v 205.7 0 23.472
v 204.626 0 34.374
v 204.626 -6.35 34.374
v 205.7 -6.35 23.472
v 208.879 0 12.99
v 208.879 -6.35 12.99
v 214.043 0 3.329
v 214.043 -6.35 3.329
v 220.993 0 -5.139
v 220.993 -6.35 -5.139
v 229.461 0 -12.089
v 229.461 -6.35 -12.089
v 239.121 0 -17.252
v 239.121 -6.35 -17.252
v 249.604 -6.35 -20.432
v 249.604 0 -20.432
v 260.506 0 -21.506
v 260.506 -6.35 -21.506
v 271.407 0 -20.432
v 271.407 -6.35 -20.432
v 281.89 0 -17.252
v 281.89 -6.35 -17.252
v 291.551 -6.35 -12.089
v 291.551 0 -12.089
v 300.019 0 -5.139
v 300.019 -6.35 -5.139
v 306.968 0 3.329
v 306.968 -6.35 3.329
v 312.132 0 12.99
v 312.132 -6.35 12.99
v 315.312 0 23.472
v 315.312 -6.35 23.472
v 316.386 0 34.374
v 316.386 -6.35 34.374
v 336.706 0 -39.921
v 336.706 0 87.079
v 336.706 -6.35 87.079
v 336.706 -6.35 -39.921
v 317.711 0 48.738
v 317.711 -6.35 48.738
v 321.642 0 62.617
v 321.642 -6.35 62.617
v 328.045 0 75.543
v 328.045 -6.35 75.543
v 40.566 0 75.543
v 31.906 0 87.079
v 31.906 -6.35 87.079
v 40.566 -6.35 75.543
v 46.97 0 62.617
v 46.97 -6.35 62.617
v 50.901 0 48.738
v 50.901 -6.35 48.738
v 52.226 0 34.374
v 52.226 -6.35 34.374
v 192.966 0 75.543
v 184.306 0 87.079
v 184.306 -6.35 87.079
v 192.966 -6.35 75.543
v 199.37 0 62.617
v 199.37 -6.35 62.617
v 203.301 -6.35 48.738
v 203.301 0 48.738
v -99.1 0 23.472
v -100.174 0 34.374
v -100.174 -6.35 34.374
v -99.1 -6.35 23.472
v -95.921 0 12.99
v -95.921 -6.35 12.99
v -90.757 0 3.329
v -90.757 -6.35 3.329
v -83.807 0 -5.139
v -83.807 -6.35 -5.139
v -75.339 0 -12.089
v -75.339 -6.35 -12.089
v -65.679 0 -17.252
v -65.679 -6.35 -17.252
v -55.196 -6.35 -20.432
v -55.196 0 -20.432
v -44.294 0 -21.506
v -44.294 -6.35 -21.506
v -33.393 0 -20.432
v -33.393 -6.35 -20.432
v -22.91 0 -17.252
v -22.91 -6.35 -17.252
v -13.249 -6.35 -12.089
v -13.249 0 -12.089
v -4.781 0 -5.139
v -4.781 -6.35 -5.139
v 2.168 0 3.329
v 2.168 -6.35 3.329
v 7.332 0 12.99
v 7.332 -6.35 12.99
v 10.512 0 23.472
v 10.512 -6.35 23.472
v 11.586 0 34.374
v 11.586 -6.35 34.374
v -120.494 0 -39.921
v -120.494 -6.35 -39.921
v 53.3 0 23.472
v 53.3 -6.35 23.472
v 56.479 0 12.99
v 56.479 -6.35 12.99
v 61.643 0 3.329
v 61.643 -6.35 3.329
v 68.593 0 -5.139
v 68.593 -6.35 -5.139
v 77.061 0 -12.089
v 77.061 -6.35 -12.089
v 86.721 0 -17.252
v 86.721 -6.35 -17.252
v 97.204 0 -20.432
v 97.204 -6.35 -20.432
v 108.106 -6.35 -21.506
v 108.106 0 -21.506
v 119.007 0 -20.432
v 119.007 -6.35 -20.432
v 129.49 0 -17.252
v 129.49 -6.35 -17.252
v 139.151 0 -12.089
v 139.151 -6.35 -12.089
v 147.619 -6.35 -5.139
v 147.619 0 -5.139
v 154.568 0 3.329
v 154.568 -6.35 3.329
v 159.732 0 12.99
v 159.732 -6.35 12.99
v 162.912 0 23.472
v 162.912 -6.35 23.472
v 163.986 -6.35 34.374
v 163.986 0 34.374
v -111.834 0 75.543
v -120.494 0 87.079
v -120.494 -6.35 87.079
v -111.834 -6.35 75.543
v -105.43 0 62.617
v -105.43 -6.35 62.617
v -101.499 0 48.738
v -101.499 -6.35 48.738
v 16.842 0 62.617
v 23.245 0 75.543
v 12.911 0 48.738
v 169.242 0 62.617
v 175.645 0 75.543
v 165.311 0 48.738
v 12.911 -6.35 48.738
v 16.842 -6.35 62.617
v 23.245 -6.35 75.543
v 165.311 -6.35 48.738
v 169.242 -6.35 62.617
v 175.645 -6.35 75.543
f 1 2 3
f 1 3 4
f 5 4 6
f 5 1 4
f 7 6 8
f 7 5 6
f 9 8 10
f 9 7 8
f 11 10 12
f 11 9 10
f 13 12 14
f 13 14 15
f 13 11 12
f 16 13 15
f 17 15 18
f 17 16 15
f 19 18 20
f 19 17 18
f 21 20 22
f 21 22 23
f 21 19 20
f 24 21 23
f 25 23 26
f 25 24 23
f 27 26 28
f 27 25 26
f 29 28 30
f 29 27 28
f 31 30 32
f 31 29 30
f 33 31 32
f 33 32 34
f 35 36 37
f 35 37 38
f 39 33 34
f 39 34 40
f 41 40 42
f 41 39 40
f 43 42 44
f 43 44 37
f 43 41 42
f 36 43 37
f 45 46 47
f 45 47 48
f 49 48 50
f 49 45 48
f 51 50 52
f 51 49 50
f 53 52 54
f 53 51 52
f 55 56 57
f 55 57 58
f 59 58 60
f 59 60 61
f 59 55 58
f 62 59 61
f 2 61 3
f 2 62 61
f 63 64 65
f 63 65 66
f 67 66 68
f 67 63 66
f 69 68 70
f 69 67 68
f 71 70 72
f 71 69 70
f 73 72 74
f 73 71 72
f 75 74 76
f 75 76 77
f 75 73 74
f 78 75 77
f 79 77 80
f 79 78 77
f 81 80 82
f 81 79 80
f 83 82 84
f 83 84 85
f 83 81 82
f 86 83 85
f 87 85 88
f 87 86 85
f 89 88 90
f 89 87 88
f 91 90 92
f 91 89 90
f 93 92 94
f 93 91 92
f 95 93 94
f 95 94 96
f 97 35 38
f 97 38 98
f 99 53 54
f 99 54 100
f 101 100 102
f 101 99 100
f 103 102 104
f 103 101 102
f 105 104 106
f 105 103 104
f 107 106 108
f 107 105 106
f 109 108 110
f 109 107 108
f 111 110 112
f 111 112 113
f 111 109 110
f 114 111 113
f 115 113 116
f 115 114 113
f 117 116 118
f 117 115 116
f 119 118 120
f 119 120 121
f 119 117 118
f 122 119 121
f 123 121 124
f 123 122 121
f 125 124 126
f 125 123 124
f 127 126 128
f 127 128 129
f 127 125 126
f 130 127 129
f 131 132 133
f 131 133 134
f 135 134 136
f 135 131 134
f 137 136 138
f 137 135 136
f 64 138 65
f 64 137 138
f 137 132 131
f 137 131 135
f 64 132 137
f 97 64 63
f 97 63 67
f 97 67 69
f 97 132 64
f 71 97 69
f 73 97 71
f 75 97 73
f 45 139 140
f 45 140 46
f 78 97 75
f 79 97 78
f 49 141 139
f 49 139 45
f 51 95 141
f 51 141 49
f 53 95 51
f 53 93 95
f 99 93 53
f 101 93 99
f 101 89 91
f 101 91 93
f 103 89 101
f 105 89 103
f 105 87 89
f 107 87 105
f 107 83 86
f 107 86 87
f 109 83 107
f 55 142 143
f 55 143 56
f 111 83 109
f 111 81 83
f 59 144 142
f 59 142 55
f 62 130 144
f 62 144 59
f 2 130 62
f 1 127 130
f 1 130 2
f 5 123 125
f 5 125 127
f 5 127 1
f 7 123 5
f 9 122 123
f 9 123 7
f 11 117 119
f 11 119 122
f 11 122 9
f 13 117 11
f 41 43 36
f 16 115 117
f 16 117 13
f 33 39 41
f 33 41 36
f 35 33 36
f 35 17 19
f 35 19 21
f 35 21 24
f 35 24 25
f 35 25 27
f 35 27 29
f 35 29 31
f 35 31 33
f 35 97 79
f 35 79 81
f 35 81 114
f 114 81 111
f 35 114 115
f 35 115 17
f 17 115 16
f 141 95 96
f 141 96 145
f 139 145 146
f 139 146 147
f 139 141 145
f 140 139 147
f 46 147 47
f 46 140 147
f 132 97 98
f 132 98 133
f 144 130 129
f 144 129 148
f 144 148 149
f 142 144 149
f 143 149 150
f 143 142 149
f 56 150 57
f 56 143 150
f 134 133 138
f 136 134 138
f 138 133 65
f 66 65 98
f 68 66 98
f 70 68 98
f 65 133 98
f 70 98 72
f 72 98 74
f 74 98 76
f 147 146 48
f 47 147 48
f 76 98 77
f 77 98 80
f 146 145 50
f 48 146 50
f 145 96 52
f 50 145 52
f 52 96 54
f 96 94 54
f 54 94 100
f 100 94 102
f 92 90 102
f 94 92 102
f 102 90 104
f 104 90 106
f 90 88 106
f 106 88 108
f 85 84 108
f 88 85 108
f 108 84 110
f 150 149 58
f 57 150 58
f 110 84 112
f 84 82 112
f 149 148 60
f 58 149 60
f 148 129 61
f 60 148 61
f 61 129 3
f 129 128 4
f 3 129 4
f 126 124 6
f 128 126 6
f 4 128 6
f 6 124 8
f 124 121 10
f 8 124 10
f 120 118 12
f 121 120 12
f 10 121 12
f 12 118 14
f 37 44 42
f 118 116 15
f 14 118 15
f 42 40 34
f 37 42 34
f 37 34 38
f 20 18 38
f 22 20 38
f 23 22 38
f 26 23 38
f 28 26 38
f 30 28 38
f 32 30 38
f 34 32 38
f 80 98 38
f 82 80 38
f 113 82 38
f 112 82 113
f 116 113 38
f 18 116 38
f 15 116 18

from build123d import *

# Parameters (mm, degrees)
BOSS_EXTRUDE1_DEPTH = 6.35


with BuildPart() as part:
    # Sketch1 → Boss-Extrude1 (new body)
    with BuildSketch(Plane(origin=(0, 0, 0), x_dir=(1, 0, 0), z_dir=(0, 1, 0))):
        with BuildLine():
            ThreePointArc((11.585828754, -34.373994235), (16.841756292, -62.617220967), (31.905828754, -87.078994235))
            Line((31.905828754, -87.078994235), (31.905828754, 39.921005765))
            Line((31.905828754, 39.921005765), (-120.494171246, 39.921005765))
            Line((-120.494171246, 39.921005765), (-120.494171246, -87.078994235))
            ThreePointArc((-120.494171246, -87.078994235), (-105.430098785, -62.617220967), (-100.174171246, -34.373994235))
            ThreePointArc((-100.174171246, -34.373994235), (-44.294171246, 21.506005765), (11.585828754, -34.373994235))
        make_face()
        with BuildLine():
            Line((31.905828754, 39.921005765), (31.905828754, -87.078994235))
            ThreePointArc((31.905828754, -87.078994235), (46.969901215, -62.617220967), (52.225828754, -34.373994235))
            ThreePointArc((52.225828754, -34.373994235), (108.105828754, 21.506005765), (163.985828754, -34.373994235))
            ThreePointArc((163.985828754, -34.373994235), (169.241756292, -62.617220967), (184.305828754, -87.078994235))
            Line((184.305828754, -87.078994235), (184.305828754, 39.921005765))
            Line((184.305828754, 39.921005765), (31.905828754, 39.921005765))
        make_face()
        with BuildLine():
            Line((336.705828754, 39.921005765), (184.305828754, 39.921005765))
            Line((184.305828754, 39.921005765), (184.305828754, -87.078994235))
            ThreePointArc((184.305828754, -87.078994235), (199.369901215, -62.617220967), (204.625828754, -34.373994235))
            ThreePointArc((204.625828754, -34.373994235), (260.505828754, 21.506005765), (316.385828754, -34.373994235))
            ThreePointArc((316.385828754, -34.373994235), (321.641756292, -62.617220967), (336.705828754, -87.078994235))
            Line((336.705828754, -87.078994235), (336.705828754, 39.921005765))
        make_face()
    extrude(amount=-BOSS_EXTRUDE1_DEPTH)


solid = part.part
